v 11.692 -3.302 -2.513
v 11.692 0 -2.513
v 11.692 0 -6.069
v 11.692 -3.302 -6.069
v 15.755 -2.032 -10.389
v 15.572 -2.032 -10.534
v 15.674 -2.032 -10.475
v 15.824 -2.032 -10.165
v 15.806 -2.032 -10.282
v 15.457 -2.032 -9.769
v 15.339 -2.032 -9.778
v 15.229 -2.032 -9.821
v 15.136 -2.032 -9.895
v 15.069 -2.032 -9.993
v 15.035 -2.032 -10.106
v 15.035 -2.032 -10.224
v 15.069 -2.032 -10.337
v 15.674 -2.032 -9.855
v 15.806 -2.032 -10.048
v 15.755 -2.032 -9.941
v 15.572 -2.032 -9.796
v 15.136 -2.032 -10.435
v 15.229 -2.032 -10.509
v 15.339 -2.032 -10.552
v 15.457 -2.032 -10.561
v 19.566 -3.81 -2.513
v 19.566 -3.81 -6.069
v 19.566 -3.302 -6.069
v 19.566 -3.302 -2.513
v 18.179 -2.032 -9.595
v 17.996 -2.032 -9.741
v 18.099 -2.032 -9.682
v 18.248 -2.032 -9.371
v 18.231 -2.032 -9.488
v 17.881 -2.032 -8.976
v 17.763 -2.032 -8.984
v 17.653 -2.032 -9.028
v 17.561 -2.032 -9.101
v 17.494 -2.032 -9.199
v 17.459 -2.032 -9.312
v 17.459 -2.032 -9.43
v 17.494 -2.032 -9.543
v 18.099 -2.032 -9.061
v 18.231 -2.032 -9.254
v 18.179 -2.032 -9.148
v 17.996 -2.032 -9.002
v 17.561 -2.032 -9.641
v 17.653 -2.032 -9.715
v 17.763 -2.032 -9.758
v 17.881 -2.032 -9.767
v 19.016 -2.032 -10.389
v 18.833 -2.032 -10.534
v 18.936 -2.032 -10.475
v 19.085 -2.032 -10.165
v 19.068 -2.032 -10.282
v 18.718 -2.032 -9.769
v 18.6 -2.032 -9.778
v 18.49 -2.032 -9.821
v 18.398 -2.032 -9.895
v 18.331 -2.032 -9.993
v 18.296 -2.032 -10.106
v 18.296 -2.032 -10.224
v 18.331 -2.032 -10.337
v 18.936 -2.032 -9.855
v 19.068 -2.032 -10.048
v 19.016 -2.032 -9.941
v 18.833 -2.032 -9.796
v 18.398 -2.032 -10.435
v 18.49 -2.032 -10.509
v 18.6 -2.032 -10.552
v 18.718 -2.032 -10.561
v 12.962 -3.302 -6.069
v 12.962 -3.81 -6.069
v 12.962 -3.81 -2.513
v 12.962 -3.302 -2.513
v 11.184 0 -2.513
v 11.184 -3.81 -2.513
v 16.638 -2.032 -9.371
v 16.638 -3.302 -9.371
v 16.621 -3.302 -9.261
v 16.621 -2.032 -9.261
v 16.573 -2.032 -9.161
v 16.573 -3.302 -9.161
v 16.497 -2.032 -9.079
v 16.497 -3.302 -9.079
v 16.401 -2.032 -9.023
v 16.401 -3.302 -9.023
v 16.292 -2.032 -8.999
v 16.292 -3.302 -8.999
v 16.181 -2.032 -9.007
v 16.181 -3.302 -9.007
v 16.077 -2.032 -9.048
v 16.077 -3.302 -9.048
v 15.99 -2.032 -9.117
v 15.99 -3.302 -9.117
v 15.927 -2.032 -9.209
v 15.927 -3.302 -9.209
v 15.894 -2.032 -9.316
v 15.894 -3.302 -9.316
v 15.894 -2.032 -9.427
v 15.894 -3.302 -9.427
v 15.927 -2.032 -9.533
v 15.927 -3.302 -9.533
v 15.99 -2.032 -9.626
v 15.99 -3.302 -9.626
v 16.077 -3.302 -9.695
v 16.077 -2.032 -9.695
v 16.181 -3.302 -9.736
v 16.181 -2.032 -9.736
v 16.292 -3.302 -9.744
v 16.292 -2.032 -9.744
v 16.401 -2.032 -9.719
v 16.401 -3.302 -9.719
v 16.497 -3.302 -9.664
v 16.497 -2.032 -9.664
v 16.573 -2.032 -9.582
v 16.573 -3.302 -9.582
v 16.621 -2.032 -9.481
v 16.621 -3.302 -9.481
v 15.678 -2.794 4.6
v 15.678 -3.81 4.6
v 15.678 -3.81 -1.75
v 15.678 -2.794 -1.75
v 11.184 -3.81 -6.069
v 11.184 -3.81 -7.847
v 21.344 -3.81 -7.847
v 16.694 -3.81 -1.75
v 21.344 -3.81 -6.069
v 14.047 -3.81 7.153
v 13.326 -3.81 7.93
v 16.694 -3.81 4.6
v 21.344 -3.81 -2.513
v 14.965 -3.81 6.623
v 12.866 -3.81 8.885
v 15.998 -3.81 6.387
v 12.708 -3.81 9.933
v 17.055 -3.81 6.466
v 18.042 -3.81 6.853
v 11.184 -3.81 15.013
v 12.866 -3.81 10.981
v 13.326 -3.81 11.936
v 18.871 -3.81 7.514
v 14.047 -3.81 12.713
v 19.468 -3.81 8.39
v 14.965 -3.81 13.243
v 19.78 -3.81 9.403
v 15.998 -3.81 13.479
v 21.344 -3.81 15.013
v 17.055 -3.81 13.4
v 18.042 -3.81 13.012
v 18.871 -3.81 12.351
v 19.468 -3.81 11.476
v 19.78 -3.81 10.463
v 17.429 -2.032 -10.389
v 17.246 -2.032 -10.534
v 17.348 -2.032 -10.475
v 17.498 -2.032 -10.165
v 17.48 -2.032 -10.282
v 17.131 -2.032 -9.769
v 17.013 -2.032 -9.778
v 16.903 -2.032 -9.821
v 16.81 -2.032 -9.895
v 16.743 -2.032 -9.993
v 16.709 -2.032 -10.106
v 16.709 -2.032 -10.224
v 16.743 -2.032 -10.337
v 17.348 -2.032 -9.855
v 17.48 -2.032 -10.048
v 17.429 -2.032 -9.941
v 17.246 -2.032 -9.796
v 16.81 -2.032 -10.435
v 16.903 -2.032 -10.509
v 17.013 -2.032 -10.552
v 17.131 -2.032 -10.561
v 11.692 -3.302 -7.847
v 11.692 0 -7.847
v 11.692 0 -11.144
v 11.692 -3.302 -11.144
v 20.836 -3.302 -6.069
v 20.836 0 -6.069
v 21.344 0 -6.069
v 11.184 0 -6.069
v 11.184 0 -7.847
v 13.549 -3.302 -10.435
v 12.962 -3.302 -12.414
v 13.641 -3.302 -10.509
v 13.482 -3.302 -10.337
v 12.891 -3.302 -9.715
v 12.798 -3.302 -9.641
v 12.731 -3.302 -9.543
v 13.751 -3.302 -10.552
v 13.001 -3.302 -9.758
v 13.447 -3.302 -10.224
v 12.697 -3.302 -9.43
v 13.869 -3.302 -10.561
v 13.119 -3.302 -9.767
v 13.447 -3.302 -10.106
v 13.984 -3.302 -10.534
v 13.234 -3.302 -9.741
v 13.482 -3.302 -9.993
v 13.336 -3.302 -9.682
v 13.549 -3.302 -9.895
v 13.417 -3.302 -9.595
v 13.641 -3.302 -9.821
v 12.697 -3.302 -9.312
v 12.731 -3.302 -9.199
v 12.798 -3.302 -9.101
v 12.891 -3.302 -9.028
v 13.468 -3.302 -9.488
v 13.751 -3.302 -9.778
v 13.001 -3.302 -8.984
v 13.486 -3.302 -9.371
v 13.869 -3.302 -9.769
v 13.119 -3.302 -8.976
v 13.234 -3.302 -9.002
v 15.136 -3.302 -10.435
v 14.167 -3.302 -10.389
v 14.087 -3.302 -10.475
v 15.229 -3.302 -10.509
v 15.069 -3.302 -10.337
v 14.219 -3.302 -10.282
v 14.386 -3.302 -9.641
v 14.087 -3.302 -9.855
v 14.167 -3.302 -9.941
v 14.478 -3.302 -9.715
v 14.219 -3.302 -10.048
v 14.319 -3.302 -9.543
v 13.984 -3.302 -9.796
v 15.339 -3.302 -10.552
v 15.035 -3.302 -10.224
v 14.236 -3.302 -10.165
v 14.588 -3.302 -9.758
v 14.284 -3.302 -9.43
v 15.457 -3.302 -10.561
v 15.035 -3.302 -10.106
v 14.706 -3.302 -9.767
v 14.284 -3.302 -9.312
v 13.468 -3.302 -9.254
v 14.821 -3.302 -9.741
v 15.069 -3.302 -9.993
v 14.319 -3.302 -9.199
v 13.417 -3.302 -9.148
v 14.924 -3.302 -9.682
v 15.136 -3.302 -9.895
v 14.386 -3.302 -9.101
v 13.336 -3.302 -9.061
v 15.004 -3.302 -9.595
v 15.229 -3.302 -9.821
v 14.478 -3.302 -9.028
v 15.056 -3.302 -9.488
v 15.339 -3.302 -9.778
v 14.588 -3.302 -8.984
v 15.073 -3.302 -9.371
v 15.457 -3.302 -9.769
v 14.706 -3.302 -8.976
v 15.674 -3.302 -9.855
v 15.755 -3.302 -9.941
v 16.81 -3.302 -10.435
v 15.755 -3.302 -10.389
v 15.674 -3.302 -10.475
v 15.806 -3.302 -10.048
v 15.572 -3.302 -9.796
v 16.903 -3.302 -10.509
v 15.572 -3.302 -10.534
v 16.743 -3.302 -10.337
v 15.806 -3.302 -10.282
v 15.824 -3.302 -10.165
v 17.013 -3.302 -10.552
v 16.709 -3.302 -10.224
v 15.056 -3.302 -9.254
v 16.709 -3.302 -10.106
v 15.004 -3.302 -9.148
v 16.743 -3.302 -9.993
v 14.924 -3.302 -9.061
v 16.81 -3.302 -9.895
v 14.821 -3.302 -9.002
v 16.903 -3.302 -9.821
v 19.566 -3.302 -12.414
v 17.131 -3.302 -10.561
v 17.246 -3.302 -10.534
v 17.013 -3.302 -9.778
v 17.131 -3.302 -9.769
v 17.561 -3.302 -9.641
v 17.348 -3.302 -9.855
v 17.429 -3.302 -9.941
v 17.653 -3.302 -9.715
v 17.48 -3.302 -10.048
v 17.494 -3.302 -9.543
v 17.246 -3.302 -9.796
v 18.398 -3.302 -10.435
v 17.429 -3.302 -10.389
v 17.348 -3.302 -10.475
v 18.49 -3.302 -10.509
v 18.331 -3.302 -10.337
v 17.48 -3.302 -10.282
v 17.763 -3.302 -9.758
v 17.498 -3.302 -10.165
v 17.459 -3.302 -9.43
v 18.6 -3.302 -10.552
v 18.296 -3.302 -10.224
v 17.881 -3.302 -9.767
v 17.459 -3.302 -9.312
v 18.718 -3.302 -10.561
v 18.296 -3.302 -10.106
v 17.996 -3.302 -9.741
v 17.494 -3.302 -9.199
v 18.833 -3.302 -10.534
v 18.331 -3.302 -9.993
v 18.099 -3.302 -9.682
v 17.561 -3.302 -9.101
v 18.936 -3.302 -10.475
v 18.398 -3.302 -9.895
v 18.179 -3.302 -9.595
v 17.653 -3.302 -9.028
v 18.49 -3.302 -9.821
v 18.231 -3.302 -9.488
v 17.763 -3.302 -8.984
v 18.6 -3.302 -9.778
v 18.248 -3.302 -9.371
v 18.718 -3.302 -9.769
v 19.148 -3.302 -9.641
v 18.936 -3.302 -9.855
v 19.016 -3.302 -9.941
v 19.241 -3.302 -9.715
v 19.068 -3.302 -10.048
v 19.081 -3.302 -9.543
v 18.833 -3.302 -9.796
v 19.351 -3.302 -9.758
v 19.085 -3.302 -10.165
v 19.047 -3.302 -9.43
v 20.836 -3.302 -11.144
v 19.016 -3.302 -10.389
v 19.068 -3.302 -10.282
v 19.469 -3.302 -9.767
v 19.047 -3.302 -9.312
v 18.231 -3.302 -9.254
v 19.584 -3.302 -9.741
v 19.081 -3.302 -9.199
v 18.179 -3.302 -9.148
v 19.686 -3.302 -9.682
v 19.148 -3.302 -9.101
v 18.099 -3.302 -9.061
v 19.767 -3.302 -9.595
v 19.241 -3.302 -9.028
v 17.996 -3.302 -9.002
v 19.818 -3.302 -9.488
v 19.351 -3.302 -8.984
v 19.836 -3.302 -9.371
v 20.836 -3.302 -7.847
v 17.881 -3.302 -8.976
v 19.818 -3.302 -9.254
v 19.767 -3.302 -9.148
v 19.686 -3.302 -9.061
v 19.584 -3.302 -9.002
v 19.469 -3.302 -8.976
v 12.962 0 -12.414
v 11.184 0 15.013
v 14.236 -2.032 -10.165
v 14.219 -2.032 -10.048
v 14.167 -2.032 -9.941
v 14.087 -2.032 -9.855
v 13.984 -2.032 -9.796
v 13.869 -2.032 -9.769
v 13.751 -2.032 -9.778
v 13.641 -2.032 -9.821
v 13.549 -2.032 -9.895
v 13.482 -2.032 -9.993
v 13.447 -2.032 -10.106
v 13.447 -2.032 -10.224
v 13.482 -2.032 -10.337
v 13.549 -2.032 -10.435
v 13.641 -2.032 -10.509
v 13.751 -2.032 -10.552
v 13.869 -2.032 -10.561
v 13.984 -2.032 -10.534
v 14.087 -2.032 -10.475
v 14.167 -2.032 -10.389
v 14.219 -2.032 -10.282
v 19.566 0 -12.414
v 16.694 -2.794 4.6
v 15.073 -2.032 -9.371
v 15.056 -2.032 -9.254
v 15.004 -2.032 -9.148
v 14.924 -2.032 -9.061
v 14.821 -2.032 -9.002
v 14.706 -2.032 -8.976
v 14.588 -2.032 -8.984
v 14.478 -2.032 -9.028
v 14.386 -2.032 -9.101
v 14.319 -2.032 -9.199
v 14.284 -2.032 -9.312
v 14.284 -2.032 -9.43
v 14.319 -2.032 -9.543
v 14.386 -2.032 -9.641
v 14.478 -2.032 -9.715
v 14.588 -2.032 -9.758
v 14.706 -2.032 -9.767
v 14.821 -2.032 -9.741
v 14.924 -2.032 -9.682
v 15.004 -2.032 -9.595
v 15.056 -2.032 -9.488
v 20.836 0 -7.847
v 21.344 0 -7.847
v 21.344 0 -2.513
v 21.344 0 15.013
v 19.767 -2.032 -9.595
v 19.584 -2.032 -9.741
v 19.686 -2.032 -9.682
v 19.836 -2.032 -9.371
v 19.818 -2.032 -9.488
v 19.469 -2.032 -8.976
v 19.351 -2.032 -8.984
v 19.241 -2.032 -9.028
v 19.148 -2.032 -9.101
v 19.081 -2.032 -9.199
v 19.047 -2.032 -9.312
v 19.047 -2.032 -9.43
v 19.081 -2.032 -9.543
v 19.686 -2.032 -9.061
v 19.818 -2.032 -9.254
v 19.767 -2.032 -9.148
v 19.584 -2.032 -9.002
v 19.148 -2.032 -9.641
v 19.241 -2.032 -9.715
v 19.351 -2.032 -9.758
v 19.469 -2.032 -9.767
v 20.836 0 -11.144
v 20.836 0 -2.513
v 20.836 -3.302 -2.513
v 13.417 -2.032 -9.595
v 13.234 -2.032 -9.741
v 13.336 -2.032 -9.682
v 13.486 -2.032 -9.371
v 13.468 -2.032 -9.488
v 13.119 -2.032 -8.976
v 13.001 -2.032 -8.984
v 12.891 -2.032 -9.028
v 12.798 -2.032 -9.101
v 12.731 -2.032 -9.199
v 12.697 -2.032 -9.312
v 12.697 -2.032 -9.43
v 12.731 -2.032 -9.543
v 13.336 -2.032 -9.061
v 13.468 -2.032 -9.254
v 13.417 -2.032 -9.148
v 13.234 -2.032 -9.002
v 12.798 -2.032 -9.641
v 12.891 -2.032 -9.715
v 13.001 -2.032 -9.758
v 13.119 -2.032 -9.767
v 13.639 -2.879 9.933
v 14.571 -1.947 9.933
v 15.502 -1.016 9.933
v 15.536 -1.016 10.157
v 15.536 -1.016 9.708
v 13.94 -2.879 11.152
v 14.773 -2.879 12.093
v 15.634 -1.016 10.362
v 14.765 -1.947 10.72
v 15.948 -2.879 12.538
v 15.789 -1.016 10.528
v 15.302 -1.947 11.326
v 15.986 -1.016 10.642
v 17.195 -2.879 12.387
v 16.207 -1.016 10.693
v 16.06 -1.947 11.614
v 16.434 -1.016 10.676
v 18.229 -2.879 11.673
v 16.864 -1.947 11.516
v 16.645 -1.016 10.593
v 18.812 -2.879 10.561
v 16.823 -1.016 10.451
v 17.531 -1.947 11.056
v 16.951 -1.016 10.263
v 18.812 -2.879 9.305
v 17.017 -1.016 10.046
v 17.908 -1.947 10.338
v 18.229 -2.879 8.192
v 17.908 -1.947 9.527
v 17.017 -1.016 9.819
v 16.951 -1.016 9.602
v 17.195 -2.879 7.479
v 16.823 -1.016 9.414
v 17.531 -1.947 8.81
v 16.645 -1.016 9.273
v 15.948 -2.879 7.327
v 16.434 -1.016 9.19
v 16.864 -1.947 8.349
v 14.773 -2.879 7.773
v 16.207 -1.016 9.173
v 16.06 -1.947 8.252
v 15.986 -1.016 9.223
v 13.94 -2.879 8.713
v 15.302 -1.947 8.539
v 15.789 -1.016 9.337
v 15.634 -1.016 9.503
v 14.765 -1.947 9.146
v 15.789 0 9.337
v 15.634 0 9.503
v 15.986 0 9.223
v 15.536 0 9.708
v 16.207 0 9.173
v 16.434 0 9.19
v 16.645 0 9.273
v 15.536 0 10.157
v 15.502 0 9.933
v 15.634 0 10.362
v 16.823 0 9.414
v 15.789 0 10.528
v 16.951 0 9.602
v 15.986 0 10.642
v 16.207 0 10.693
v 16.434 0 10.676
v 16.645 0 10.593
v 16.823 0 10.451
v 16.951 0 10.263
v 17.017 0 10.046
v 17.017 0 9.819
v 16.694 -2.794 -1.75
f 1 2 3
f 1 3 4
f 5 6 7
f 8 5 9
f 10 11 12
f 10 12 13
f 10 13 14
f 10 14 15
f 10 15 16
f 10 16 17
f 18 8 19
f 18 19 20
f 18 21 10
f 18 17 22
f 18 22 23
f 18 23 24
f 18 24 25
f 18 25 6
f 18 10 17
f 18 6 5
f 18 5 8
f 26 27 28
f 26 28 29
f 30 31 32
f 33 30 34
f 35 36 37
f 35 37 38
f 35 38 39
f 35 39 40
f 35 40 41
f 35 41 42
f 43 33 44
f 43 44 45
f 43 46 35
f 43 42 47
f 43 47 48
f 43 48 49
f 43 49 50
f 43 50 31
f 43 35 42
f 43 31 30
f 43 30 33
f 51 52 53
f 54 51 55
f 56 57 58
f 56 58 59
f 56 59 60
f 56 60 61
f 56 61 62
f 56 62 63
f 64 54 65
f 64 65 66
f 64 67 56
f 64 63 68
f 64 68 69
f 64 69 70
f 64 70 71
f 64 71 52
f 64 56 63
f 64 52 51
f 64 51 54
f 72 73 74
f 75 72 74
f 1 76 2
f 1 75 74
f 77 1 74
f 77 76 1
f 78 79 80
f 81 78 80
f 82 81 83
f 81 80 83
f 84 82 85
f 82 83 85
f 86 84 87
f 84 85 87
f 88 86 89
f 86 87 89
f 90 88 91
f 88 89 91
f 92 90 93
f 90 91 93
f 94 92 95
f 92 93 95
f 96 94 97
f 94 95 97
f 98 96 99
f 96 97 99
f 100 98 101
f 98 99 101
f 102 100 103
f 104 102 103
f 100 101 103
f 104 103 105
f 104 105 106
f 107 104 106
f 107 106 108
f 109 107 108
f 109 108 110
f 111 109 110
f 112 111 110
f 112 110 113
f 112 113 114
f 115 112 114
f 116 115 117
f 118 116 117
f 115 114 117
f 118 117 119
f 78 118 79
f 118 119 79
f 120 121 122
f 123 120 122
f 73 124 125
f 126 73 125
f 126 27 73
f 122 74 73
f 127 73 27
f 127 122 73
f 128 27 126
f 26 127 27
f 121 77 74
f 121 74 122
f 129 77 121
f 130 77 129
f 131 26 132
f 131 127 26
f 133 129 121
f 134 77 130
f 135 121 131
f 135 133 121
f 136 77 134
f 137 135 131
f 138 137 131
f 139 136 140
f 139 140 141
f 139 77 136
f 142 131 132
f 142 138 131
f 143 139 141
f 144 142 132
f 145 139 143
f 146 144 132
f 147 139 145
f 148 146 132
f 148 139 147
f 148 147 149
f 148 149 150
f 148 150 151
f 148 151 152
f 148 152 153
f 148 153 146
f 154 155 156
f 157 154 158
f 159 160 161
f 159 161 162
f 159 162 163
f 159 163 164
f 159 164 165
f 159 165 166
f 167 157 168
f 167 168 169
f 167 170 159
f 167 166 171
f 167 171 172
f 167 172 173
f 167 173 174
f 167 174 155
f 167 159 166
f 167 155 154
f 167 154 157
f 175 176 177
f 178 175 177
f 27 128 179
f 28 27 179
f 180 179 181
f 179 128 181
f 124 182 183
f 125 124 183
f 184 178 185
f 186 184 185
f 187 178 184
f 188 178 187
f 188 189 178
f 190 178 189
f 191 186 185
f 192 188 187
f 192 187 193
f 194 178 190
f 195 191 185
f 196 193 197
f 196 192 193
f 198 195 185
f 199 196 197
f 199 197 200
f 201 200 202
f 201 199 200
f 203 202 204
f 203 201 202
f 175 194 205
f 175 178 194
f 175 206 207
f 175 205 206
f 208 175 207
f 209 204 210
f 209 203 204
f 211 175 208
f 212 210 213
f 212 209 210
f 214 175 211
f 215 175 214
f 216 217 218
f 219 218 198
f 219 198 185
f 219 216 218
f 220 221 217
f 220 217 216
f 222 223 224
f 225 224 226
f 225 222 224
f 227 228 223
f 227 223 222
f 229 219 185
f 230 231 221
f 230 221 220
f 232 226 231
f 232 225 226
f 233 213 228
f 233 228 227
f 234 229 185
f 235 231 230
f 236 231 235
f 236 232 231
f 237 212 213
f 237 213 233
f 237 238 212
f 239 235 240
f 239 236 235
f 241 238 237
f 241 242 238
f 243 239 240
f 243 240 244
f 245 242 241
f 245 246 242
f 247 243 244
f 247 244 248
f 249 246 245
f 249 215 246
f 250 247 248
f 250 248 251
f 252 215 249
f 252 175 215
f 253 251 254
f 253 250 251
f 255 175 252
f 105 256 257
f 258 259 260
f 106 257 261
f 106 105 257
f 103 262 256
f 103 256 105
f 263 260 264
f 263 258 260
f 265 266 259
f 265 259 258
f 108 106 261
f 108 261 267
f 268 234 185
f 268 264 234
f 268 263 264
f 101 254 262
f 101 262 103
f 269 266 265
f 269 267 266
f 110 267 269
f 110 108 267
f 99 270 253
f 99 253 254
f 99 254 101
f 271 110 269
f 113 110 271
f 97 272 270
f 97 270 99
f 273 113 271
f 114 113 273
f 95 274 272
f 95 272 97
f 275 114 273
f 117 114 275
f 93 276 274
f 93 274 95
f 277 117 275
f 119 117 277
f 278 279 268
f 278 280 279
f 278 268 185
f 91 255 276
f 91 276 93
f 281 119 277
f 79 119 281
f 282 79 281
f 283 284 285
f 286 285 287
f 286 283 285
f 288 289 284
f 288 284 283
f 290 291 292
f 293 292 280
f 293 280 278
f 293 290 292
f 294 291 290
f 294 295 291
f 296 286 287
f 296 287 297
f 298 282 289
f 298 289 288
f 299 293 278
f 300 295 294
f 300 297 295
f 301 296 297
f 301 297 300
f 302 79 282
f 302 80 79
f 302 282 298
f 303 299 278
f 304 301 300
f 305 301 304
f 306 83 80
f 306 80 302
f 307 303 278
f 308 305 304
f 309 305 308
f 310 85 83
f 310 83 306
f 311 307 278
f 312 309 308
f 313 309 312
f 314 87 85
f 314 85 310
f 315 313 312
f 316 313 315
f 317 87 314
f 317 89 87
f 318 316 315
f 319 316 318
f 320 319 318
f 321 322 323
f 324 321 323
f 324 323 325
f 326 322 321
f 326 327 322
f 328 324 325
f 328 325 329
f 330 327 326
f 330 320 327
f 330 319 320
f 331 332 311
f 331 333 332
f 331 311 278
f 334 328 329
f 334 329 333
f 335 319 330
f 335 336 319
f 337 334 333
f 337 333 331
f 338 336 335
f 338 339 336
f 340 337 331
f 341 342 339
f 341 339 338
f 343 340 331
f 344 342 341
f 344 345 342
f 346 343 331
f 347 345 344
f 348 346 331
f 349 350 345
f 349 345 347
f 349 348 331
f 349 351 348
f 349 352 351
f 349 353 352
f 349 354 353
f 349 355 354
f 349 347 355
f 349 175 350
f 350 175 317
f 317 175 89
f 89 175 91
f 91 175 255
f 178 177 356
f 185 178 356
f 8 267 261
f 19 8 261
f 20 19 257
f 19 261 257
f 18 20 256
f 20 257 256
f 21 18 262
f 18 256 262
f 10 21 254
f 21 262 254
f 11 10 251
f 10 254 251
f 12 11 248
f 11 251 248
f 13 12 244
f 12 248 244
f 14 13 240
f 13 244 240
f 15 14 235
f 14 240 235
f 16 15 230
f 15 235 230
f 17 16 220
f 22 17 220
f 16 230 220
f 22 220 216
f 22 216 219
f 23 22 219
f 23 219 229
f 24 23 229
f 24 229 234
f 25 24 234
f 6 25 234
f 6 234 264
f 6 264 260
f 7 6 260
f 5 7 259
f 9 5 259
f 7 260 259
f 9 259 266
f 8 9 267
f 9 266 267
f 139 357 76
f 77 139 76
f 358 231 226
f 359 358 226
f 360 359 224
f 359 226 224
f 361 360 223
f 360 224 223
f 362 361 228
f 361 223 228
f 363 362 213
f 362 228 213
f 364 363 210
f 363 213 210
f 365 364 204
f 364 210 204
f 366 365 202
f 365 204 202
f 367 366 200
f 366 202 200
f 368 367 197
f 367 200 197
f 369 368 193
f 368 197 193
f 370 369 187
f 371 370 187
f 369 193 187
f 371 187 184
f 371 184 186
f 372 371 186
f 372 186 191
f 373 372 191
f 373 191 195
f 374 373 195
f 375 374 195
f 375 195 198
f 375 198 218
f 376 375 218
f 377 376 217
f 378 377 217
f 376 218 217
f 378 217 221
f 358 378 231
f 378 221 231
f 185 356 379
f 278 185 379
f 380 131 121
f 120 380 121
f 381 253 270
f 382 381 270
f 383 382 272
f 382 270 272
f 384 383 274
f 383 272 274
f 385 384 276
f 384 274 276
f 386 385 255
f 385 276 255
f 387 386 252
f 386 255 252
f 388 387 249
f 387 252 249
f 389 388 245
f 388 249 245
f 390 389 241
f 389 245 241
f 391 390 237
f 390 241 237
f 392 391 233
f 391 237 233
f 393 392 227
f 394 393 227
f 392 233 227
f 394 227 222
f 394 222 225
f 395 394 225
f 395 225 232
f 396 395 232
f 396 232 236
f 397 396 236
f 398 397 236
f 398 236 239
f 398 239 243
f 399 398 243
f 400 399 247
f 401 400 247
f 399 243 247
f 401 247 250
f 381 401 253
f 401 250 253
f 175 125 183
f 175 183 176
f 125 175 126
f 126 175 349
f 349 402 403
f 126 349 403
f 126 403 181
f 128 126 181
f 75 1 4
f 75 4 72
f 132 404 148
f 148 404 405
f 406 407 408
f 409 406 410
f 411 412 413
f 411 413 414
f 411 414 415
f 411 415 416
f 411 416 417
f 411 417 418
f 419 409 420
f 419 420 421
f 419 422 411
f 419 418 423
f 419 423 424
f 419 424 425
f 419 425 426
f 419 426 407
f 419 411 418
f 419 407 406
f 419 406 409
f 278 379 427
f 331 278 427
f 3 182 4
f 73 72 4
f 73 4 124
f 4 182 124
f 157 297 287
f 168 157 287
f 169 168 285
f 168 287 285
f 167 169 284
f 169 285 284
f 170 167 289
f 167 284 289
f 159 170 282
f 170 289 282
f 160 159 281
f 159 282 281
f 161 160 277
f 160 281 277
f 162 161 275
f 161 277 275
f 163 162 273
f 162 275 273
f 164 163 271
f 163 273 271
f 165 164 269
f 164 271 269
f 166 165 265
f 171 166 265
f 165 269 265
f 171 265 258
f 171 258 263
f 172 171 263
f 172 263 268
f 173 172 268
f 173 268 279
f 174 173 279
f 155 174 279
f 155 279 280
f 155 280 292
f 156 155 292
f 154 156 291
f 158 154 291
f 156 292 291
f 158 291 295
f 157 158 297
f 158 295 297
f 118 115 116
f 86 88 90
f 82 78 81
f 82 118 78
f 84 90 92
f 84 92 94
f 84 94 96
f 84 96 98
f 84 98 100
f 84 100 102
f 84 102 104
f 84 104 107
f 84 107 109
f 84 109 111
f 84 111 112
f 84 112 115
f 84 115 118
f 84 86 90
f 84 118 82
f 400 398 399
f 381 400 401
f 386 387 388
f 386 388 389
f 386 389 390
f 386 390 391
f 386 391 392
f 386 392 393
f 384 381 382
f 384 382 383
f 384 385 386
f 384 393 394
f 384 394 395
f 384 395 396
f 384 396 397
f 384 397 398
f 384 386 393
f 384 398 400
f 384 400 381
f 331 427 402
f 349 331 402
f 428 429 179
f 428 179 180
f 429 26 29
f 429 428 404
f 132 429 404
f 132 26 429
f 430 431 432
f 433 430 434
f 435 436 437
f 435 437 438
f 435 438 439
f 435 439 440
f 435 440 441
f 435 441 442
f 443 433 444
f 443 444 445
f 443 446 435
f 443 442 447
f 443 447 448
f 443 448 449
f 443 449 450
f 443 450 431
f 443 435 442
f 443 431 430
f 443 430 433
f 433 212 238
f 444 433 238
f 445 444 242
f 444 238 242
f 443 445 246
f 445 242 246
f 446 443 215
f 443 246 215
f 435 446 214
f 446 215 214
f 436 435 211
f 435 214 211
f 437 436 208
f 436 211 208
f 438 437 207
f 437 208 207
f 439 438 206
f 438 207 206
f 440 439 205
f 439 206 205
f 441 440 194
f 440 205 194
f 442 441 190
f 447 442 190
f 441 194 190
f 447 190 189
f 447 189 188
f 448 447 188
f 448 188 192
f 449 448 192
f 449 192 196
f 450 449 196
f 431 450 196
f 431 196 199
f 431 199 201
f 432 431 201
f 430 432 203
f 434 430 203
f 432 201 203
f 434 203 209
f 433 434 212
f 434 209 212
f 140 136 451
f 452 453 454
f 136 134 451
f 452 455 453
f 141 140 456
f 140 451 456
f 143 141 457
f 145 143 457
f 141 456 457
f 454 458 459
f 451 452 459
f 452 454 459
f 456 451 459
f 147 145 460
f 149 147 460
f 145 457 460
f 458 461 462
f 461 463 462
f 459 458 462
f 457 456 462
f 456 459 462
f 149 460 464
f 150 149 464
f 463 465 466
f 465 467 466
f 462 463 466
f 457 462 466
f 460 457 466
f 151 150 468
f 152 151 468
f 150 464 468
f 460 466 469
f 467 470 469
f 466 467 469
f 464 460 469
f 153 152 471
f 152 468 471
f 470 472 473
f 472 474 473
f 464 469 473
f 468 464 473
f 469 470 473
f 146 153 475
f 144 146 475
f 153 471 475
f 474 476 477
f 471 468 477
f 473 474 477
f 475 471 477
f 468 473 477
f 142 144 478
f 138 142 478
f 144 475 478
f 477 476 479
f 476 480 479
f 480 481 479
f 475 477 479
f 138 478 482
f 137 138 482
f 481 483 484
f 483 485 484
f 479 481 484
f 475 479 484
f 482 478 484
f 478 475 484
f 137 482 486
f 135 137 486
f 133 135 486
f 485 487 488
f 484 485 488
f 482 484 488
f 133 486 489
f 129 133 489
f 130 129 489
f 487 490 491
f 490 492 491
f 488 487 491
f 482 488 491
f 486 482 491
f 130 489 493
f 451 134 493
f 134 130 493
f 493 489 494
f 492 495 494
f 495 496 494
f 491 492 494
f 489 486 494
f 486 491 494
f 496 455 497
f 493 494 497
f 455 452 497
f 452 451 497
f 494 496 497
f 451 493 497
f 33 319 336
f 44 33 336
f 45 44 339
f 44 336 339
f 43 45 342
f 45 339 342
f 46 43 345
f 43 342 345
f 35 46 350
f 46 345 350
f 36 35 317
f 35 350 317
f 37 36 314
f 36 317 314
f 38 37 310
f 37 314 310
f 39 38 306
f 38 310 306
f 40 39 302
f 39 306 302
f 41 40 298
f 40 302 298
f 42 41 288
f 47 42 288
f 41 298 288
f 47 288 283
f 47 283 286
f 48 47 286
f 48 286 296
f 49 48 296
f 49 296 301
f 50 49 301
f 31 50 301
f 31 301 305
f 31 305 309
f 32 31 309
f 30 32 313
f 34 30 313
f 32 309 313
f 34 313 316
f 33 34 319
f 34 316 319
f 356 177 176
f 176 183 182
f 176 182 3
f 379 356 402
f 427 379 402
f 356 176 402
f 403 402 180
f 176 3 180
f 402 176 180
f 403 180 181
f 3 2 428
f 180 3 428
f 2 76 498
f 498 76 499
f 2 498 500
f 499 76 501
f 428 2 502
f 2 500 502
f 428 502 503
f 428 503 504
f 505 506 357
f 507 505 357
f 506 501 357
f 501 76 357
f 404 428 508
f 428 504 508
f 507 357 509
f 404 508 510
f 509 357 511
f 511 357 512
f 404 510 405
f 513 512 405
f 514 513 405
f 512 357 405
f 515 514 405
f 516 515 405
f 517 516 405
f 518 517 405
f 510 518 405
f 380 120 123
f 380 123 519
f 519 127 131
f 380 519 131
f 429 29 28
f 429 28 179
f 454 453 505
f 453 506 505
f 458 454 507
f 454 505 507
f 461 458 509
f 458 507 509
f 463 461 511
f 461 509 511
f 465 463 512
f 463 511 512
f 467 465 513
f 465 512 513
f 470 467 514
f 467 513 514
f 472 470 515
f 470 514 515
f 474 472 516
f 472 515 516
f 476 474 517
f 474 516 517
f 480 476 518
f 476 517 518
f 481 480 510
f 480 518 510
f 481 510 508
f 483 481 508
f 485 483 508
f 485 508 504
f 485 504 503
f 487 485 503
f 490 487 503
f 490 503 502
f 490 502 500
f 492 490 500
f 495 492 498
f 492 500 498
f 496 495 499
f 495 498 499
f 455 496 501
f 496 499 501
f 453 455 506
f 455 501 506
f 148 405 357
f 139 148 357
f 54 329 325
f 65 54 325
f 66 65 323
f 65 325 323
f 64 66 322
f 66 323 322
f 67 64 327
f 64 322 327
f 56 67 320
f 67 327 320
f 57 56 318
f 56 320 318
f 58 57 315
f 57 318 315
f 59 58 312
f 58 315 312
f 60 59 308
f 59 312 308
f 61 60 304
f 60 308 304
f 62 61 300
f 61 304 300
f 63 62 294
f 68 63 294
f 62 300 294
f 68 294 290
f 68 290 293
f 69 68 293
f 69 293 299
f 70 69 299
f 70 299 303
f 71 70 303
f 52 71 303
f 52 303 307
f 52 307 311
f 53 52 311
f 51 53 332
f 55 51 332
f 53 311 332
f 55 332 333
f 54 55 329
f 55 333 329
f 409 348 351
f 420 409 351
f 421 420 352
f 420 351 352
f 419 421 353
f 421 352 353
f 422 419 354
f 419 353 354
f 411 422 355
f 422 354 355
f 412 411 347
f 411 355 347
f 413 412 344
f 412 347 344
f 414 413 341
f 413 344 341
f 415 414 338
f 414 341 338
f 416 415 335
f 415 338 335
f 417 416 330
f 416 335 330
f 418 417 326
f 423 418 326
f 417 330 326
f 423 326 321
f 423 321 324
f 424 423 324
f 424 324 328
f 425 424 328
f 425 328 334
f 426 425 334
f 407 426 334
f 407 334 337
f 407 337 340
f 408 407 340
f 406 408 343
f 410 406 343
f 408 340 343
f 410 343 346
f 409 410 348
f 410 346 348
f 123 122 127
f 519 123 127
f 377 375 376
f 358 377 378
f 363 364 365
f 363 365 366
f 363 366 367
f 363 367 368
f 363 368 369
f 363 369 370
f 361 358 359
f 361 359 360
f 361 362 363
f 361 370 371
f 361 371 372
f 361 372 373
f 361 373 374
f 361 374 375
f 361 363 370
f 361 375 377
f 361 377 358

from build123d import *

# Parameters (mm, degrees)
F1_DEPTH       = 3.81
F2_DEPTH       = 3.302
F4_D           = 1.524
F4_CSINK_D     = 7.112
F4_CSINK_ANGLE = 90
F6_DEPTH       = 1.016
F7_W           = 1.778
F7_H           = 3.556
F8_DEPTH       = 0.508
F9_W           = 3.302
F9_H           = 3.556
F10_DEPTH      = 0.508
F11_W          = 3.302
F11_H          = 3.556
F12_DEPTH      = 0.508
F13_R          = 0.396875
F13_R_2        = 0.3737664599
F14_DEPTH      = 1.27


with BuildPart() as f1:
    # F0 (on Front) → F1 (new body)
    with BuildSketch(Plane.XZ):
        Polygon((21.3439739875, 15.0127133582), (11.1839739875, 15.0127133582), (11.1839739875, -7.8472866418), (11.6919739875, -7.8472866418), (20.8359739875, -7.8472866418), (21.3439739875, -7.8472866418), align=None)
    extrude(amount=F1_DEPTH)

    # F0 (on Front) → F2 (join)
    with BuildSketch(Plane.XZ):
        Polygon((20.8359739875, -7.8472866418), (11.6919739875, -7.8472866418), (11.6919739875, -11.1442380585), (12.9619739875, -12.4142380585), (19.5659739875, -12.4142380585), (20.8359739875, -11.1442380585), align=None)
    extrude(amount=F2_DEPTH)

    # F4 (through all)
    with Locations(Plane.XZ.offset(3.81)):
        with Locations((16.2639739875, 9.9327133582)):
            CounterSinkHole(F4_D / 2, F4_CSINK_D / 2, counter_sink_angle=F4_CSINK_ANGLE)

    # F5 (on face) → F6 (cut)
    with BuildSketch(Plane.XZ.offset(3.81)):
        Polygon((16.6935976049, 4.5998531383), (16.1855976049, 4.5998531383), (15.6775976049, 4.5998531383), (15.6775976049, -1.7501468617), (16.6935976049, -1.7501468617), align=None)
    extrude(amount=-F6_DEPTH, mode=Mode.SUBTRACT)

    # F7 (on face) → F8 (cut)
    with BuildSketch(Plane.XZ.offset(3.81)):
        with Locations((12.0729739875, -4.2912866418)):
            Rectangle(F7_W, F7_H)
        with Locations((20.4549739875, -4.2912866418)):
            Rectangle(F7_W, F7_H)
    extrude(amount=-F8_DEPTH, mode=Mode.SUBTRACT)

    # F9 (on face) → F10 (cut)
    with BuildSketch(Plane.YZ.offset(21.3439739875)):
        with Locations((-1.651, -4.2912866418)):
            Rectangle(F9_W, F9_H)
    extrude(amount=-F10_DEPTH, mode=Mode.SUBTRACT)

    # F11 (on face) → F12 (cut)
    with BuildSketch(Plane(origin=(11.1839739875, 0, 0), x_dir=(0, -1, 0), z_dir=(-1, 0, 0))):
        with Locations((1.651, -4.2912866418)):
            Rectangle(F11_W, F11_H)
    extrude(amount=-F12_DEPTH, mode=Mode.SUBTRACT)

    # F13 (on face) → F14 (cut)
    with BuildSketch(Plane.XZ.offset(3.302)):
        with Locations((13.0889739875, -9.3712866418)):
            Circle(F13_R)
        with Locations((14.6764739875, -9.3712866418)):
            Circle(F13_R)
        with Locations((13.8395041891, -10.1650366418)):
            Circle(F13_R)
        with Locations((15.4270041891, -10.1650366418)):
            Circle(F13_R)
        with Locations((16.2639739875, -9.3712866418)):
            Circle(F13_R_2)
        with Locations((17.1009437859, -10.1650366418)):
            Circle(F13_R)
        with Locations((17.8514739875, -9.3712866418)):
            Circle(F13_R)
        with Locations((18.6884437859, -10.1650366418)):
            Circle(F13_R)
        with Locations((19.4389739875, -9.3712866418)):
            Circle(F13_R)
    extrude(amount=-F14_DEPTH, mode=Mode.SUBTRACT)


solid = f1.part
